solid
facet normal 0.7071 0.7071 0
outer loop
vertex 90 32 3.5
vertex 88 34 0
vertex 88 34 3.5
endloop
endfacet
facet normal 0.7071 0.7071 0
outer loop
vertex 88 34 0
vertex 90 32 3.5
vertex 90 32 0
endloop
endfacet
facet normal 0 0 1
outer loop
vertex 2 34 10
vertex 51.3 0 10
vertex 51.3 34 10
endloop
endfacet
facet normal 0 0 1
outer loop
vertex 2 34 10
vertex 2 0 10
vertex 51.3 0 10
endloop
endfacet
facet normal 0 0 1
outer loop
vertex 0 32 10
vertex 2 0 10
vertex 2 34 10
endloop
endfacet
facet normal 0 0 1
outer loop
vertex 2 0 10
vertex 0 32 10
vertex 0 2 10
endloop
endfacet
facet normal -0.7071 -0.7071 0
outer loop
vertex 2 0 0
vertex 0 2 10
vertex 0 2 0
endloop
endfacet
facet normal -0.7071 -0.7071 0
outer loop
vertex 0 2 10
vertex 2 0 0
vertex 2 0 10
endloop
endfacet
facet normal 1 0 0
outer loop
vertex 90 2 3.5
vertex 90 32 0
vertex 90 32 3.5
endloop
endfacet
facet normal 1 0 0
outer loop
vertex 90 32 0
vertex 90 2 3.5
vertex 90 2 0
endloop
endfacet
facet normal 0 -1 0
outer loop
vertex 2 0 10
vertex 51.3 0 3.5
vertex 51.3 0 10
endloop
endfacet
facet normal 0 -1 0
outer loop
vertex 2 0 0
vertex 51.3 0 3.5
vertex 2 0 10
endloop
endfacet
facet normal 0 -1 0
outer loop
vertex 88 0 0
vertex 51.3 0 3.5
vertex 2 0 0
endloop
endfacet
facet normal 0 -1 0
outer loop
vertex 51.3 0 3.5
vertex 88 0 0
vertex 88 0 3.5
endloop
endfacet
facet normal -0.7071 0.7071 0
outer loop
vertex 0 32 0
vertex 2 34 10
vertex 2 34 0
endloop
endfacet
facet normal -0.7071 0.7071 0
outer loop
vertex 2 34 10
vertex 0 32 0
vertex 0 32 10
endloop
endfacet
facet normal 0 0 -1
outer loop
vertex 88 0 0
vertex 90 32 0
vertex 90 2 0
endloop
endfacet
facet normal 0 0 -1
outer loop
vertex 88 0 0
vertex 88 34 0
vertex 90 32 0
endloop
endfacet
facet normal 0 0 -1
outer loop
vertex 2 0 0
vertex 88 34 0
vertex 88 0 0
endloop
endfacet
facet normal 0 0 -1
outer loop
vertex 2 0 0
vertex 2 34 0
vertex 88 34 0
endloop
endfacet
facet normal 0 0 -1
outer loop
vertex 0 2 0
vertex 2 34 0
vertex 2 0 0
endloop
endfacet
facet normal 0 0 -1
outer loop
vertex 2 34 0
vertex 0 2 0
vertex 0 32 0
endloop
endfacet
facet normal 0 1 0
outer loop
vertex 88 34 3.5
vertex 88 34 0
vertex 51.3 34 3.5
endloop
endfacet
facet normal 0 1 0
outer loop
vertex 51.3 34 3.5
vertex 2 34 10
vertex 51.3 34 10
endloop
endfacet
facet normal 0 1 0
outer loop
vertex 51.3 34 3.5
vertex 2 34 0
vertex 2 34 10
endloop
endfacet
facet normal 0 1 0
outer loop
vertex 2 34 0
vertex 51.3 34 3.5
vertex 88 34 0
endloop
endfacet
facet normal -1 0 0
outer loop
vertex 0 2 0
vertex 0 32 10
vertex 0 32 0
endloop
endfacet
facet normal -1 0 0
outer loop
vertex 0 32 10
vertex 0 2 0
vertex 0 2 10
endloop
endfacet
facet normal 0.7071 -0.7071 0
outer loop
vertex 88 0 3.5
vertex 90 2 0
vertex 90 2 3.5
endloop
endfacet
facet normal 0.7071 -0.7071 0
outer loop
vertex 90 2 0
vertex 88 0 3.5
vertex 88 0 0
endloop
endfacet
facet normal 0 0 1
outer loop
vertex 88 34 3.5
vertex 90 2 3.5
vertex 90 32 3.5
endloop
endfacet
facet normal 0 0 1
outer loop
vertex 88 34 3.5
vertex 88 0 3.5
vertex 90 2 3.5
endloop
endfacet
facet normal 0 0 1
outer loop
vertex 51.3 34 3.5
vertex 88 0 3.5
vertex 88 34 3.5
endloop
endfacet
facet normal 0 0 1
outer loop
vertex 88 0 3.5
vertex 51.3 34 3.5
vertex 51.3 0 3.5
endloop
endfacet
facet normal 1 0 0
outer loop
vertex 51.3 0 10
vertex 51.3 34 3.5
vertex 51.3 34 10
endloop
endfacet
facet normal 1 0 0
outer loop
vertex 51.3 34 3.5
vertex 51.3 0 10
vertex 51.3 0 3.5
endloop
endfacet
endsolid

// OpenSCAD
$fn = 32;

// ----------------------------------------------------------------------
// Stepped bar: endstep, 90 x 34 x 10/3.5 mm
// ----------------------------------------------------------------------

// --- parameters (mm) ---
bar_l = 90;               // bar length, X
bar_w = 34;               // bar width, Y
plate_t = 10;             // thickness of the thick zone, Z
thin_t = 3.5;             // thickness of the thin zone
corner_c = 2;             // corner chamfer of the bar
step_cut = 6.5;           // material removed from the thin zone
step_x = 51.3;            // step position from the left end
depth_1 = 6.5;            // depth of cut 1 from the top face

profile = [[2, 0], [88, 0], [90, 2], [90, 32], [88, 34], [2, 34], [0, 32], [0, 2]];  // primary outline, 8 points, counter clockwise
void_1 = [[51.3, -1], [91, -1], [91, 35], [51.3, 35]];  // thin zone beyond the step, 4 points

// --- the one profile operation ---
difference() {
  linear_extrude(height = plate_t) polygon(points = profile);
  translate([0, 0, plate_t - depth_1])
    linear_extrude(height = depth_1 + 1) polygon(points = void_1);
}
